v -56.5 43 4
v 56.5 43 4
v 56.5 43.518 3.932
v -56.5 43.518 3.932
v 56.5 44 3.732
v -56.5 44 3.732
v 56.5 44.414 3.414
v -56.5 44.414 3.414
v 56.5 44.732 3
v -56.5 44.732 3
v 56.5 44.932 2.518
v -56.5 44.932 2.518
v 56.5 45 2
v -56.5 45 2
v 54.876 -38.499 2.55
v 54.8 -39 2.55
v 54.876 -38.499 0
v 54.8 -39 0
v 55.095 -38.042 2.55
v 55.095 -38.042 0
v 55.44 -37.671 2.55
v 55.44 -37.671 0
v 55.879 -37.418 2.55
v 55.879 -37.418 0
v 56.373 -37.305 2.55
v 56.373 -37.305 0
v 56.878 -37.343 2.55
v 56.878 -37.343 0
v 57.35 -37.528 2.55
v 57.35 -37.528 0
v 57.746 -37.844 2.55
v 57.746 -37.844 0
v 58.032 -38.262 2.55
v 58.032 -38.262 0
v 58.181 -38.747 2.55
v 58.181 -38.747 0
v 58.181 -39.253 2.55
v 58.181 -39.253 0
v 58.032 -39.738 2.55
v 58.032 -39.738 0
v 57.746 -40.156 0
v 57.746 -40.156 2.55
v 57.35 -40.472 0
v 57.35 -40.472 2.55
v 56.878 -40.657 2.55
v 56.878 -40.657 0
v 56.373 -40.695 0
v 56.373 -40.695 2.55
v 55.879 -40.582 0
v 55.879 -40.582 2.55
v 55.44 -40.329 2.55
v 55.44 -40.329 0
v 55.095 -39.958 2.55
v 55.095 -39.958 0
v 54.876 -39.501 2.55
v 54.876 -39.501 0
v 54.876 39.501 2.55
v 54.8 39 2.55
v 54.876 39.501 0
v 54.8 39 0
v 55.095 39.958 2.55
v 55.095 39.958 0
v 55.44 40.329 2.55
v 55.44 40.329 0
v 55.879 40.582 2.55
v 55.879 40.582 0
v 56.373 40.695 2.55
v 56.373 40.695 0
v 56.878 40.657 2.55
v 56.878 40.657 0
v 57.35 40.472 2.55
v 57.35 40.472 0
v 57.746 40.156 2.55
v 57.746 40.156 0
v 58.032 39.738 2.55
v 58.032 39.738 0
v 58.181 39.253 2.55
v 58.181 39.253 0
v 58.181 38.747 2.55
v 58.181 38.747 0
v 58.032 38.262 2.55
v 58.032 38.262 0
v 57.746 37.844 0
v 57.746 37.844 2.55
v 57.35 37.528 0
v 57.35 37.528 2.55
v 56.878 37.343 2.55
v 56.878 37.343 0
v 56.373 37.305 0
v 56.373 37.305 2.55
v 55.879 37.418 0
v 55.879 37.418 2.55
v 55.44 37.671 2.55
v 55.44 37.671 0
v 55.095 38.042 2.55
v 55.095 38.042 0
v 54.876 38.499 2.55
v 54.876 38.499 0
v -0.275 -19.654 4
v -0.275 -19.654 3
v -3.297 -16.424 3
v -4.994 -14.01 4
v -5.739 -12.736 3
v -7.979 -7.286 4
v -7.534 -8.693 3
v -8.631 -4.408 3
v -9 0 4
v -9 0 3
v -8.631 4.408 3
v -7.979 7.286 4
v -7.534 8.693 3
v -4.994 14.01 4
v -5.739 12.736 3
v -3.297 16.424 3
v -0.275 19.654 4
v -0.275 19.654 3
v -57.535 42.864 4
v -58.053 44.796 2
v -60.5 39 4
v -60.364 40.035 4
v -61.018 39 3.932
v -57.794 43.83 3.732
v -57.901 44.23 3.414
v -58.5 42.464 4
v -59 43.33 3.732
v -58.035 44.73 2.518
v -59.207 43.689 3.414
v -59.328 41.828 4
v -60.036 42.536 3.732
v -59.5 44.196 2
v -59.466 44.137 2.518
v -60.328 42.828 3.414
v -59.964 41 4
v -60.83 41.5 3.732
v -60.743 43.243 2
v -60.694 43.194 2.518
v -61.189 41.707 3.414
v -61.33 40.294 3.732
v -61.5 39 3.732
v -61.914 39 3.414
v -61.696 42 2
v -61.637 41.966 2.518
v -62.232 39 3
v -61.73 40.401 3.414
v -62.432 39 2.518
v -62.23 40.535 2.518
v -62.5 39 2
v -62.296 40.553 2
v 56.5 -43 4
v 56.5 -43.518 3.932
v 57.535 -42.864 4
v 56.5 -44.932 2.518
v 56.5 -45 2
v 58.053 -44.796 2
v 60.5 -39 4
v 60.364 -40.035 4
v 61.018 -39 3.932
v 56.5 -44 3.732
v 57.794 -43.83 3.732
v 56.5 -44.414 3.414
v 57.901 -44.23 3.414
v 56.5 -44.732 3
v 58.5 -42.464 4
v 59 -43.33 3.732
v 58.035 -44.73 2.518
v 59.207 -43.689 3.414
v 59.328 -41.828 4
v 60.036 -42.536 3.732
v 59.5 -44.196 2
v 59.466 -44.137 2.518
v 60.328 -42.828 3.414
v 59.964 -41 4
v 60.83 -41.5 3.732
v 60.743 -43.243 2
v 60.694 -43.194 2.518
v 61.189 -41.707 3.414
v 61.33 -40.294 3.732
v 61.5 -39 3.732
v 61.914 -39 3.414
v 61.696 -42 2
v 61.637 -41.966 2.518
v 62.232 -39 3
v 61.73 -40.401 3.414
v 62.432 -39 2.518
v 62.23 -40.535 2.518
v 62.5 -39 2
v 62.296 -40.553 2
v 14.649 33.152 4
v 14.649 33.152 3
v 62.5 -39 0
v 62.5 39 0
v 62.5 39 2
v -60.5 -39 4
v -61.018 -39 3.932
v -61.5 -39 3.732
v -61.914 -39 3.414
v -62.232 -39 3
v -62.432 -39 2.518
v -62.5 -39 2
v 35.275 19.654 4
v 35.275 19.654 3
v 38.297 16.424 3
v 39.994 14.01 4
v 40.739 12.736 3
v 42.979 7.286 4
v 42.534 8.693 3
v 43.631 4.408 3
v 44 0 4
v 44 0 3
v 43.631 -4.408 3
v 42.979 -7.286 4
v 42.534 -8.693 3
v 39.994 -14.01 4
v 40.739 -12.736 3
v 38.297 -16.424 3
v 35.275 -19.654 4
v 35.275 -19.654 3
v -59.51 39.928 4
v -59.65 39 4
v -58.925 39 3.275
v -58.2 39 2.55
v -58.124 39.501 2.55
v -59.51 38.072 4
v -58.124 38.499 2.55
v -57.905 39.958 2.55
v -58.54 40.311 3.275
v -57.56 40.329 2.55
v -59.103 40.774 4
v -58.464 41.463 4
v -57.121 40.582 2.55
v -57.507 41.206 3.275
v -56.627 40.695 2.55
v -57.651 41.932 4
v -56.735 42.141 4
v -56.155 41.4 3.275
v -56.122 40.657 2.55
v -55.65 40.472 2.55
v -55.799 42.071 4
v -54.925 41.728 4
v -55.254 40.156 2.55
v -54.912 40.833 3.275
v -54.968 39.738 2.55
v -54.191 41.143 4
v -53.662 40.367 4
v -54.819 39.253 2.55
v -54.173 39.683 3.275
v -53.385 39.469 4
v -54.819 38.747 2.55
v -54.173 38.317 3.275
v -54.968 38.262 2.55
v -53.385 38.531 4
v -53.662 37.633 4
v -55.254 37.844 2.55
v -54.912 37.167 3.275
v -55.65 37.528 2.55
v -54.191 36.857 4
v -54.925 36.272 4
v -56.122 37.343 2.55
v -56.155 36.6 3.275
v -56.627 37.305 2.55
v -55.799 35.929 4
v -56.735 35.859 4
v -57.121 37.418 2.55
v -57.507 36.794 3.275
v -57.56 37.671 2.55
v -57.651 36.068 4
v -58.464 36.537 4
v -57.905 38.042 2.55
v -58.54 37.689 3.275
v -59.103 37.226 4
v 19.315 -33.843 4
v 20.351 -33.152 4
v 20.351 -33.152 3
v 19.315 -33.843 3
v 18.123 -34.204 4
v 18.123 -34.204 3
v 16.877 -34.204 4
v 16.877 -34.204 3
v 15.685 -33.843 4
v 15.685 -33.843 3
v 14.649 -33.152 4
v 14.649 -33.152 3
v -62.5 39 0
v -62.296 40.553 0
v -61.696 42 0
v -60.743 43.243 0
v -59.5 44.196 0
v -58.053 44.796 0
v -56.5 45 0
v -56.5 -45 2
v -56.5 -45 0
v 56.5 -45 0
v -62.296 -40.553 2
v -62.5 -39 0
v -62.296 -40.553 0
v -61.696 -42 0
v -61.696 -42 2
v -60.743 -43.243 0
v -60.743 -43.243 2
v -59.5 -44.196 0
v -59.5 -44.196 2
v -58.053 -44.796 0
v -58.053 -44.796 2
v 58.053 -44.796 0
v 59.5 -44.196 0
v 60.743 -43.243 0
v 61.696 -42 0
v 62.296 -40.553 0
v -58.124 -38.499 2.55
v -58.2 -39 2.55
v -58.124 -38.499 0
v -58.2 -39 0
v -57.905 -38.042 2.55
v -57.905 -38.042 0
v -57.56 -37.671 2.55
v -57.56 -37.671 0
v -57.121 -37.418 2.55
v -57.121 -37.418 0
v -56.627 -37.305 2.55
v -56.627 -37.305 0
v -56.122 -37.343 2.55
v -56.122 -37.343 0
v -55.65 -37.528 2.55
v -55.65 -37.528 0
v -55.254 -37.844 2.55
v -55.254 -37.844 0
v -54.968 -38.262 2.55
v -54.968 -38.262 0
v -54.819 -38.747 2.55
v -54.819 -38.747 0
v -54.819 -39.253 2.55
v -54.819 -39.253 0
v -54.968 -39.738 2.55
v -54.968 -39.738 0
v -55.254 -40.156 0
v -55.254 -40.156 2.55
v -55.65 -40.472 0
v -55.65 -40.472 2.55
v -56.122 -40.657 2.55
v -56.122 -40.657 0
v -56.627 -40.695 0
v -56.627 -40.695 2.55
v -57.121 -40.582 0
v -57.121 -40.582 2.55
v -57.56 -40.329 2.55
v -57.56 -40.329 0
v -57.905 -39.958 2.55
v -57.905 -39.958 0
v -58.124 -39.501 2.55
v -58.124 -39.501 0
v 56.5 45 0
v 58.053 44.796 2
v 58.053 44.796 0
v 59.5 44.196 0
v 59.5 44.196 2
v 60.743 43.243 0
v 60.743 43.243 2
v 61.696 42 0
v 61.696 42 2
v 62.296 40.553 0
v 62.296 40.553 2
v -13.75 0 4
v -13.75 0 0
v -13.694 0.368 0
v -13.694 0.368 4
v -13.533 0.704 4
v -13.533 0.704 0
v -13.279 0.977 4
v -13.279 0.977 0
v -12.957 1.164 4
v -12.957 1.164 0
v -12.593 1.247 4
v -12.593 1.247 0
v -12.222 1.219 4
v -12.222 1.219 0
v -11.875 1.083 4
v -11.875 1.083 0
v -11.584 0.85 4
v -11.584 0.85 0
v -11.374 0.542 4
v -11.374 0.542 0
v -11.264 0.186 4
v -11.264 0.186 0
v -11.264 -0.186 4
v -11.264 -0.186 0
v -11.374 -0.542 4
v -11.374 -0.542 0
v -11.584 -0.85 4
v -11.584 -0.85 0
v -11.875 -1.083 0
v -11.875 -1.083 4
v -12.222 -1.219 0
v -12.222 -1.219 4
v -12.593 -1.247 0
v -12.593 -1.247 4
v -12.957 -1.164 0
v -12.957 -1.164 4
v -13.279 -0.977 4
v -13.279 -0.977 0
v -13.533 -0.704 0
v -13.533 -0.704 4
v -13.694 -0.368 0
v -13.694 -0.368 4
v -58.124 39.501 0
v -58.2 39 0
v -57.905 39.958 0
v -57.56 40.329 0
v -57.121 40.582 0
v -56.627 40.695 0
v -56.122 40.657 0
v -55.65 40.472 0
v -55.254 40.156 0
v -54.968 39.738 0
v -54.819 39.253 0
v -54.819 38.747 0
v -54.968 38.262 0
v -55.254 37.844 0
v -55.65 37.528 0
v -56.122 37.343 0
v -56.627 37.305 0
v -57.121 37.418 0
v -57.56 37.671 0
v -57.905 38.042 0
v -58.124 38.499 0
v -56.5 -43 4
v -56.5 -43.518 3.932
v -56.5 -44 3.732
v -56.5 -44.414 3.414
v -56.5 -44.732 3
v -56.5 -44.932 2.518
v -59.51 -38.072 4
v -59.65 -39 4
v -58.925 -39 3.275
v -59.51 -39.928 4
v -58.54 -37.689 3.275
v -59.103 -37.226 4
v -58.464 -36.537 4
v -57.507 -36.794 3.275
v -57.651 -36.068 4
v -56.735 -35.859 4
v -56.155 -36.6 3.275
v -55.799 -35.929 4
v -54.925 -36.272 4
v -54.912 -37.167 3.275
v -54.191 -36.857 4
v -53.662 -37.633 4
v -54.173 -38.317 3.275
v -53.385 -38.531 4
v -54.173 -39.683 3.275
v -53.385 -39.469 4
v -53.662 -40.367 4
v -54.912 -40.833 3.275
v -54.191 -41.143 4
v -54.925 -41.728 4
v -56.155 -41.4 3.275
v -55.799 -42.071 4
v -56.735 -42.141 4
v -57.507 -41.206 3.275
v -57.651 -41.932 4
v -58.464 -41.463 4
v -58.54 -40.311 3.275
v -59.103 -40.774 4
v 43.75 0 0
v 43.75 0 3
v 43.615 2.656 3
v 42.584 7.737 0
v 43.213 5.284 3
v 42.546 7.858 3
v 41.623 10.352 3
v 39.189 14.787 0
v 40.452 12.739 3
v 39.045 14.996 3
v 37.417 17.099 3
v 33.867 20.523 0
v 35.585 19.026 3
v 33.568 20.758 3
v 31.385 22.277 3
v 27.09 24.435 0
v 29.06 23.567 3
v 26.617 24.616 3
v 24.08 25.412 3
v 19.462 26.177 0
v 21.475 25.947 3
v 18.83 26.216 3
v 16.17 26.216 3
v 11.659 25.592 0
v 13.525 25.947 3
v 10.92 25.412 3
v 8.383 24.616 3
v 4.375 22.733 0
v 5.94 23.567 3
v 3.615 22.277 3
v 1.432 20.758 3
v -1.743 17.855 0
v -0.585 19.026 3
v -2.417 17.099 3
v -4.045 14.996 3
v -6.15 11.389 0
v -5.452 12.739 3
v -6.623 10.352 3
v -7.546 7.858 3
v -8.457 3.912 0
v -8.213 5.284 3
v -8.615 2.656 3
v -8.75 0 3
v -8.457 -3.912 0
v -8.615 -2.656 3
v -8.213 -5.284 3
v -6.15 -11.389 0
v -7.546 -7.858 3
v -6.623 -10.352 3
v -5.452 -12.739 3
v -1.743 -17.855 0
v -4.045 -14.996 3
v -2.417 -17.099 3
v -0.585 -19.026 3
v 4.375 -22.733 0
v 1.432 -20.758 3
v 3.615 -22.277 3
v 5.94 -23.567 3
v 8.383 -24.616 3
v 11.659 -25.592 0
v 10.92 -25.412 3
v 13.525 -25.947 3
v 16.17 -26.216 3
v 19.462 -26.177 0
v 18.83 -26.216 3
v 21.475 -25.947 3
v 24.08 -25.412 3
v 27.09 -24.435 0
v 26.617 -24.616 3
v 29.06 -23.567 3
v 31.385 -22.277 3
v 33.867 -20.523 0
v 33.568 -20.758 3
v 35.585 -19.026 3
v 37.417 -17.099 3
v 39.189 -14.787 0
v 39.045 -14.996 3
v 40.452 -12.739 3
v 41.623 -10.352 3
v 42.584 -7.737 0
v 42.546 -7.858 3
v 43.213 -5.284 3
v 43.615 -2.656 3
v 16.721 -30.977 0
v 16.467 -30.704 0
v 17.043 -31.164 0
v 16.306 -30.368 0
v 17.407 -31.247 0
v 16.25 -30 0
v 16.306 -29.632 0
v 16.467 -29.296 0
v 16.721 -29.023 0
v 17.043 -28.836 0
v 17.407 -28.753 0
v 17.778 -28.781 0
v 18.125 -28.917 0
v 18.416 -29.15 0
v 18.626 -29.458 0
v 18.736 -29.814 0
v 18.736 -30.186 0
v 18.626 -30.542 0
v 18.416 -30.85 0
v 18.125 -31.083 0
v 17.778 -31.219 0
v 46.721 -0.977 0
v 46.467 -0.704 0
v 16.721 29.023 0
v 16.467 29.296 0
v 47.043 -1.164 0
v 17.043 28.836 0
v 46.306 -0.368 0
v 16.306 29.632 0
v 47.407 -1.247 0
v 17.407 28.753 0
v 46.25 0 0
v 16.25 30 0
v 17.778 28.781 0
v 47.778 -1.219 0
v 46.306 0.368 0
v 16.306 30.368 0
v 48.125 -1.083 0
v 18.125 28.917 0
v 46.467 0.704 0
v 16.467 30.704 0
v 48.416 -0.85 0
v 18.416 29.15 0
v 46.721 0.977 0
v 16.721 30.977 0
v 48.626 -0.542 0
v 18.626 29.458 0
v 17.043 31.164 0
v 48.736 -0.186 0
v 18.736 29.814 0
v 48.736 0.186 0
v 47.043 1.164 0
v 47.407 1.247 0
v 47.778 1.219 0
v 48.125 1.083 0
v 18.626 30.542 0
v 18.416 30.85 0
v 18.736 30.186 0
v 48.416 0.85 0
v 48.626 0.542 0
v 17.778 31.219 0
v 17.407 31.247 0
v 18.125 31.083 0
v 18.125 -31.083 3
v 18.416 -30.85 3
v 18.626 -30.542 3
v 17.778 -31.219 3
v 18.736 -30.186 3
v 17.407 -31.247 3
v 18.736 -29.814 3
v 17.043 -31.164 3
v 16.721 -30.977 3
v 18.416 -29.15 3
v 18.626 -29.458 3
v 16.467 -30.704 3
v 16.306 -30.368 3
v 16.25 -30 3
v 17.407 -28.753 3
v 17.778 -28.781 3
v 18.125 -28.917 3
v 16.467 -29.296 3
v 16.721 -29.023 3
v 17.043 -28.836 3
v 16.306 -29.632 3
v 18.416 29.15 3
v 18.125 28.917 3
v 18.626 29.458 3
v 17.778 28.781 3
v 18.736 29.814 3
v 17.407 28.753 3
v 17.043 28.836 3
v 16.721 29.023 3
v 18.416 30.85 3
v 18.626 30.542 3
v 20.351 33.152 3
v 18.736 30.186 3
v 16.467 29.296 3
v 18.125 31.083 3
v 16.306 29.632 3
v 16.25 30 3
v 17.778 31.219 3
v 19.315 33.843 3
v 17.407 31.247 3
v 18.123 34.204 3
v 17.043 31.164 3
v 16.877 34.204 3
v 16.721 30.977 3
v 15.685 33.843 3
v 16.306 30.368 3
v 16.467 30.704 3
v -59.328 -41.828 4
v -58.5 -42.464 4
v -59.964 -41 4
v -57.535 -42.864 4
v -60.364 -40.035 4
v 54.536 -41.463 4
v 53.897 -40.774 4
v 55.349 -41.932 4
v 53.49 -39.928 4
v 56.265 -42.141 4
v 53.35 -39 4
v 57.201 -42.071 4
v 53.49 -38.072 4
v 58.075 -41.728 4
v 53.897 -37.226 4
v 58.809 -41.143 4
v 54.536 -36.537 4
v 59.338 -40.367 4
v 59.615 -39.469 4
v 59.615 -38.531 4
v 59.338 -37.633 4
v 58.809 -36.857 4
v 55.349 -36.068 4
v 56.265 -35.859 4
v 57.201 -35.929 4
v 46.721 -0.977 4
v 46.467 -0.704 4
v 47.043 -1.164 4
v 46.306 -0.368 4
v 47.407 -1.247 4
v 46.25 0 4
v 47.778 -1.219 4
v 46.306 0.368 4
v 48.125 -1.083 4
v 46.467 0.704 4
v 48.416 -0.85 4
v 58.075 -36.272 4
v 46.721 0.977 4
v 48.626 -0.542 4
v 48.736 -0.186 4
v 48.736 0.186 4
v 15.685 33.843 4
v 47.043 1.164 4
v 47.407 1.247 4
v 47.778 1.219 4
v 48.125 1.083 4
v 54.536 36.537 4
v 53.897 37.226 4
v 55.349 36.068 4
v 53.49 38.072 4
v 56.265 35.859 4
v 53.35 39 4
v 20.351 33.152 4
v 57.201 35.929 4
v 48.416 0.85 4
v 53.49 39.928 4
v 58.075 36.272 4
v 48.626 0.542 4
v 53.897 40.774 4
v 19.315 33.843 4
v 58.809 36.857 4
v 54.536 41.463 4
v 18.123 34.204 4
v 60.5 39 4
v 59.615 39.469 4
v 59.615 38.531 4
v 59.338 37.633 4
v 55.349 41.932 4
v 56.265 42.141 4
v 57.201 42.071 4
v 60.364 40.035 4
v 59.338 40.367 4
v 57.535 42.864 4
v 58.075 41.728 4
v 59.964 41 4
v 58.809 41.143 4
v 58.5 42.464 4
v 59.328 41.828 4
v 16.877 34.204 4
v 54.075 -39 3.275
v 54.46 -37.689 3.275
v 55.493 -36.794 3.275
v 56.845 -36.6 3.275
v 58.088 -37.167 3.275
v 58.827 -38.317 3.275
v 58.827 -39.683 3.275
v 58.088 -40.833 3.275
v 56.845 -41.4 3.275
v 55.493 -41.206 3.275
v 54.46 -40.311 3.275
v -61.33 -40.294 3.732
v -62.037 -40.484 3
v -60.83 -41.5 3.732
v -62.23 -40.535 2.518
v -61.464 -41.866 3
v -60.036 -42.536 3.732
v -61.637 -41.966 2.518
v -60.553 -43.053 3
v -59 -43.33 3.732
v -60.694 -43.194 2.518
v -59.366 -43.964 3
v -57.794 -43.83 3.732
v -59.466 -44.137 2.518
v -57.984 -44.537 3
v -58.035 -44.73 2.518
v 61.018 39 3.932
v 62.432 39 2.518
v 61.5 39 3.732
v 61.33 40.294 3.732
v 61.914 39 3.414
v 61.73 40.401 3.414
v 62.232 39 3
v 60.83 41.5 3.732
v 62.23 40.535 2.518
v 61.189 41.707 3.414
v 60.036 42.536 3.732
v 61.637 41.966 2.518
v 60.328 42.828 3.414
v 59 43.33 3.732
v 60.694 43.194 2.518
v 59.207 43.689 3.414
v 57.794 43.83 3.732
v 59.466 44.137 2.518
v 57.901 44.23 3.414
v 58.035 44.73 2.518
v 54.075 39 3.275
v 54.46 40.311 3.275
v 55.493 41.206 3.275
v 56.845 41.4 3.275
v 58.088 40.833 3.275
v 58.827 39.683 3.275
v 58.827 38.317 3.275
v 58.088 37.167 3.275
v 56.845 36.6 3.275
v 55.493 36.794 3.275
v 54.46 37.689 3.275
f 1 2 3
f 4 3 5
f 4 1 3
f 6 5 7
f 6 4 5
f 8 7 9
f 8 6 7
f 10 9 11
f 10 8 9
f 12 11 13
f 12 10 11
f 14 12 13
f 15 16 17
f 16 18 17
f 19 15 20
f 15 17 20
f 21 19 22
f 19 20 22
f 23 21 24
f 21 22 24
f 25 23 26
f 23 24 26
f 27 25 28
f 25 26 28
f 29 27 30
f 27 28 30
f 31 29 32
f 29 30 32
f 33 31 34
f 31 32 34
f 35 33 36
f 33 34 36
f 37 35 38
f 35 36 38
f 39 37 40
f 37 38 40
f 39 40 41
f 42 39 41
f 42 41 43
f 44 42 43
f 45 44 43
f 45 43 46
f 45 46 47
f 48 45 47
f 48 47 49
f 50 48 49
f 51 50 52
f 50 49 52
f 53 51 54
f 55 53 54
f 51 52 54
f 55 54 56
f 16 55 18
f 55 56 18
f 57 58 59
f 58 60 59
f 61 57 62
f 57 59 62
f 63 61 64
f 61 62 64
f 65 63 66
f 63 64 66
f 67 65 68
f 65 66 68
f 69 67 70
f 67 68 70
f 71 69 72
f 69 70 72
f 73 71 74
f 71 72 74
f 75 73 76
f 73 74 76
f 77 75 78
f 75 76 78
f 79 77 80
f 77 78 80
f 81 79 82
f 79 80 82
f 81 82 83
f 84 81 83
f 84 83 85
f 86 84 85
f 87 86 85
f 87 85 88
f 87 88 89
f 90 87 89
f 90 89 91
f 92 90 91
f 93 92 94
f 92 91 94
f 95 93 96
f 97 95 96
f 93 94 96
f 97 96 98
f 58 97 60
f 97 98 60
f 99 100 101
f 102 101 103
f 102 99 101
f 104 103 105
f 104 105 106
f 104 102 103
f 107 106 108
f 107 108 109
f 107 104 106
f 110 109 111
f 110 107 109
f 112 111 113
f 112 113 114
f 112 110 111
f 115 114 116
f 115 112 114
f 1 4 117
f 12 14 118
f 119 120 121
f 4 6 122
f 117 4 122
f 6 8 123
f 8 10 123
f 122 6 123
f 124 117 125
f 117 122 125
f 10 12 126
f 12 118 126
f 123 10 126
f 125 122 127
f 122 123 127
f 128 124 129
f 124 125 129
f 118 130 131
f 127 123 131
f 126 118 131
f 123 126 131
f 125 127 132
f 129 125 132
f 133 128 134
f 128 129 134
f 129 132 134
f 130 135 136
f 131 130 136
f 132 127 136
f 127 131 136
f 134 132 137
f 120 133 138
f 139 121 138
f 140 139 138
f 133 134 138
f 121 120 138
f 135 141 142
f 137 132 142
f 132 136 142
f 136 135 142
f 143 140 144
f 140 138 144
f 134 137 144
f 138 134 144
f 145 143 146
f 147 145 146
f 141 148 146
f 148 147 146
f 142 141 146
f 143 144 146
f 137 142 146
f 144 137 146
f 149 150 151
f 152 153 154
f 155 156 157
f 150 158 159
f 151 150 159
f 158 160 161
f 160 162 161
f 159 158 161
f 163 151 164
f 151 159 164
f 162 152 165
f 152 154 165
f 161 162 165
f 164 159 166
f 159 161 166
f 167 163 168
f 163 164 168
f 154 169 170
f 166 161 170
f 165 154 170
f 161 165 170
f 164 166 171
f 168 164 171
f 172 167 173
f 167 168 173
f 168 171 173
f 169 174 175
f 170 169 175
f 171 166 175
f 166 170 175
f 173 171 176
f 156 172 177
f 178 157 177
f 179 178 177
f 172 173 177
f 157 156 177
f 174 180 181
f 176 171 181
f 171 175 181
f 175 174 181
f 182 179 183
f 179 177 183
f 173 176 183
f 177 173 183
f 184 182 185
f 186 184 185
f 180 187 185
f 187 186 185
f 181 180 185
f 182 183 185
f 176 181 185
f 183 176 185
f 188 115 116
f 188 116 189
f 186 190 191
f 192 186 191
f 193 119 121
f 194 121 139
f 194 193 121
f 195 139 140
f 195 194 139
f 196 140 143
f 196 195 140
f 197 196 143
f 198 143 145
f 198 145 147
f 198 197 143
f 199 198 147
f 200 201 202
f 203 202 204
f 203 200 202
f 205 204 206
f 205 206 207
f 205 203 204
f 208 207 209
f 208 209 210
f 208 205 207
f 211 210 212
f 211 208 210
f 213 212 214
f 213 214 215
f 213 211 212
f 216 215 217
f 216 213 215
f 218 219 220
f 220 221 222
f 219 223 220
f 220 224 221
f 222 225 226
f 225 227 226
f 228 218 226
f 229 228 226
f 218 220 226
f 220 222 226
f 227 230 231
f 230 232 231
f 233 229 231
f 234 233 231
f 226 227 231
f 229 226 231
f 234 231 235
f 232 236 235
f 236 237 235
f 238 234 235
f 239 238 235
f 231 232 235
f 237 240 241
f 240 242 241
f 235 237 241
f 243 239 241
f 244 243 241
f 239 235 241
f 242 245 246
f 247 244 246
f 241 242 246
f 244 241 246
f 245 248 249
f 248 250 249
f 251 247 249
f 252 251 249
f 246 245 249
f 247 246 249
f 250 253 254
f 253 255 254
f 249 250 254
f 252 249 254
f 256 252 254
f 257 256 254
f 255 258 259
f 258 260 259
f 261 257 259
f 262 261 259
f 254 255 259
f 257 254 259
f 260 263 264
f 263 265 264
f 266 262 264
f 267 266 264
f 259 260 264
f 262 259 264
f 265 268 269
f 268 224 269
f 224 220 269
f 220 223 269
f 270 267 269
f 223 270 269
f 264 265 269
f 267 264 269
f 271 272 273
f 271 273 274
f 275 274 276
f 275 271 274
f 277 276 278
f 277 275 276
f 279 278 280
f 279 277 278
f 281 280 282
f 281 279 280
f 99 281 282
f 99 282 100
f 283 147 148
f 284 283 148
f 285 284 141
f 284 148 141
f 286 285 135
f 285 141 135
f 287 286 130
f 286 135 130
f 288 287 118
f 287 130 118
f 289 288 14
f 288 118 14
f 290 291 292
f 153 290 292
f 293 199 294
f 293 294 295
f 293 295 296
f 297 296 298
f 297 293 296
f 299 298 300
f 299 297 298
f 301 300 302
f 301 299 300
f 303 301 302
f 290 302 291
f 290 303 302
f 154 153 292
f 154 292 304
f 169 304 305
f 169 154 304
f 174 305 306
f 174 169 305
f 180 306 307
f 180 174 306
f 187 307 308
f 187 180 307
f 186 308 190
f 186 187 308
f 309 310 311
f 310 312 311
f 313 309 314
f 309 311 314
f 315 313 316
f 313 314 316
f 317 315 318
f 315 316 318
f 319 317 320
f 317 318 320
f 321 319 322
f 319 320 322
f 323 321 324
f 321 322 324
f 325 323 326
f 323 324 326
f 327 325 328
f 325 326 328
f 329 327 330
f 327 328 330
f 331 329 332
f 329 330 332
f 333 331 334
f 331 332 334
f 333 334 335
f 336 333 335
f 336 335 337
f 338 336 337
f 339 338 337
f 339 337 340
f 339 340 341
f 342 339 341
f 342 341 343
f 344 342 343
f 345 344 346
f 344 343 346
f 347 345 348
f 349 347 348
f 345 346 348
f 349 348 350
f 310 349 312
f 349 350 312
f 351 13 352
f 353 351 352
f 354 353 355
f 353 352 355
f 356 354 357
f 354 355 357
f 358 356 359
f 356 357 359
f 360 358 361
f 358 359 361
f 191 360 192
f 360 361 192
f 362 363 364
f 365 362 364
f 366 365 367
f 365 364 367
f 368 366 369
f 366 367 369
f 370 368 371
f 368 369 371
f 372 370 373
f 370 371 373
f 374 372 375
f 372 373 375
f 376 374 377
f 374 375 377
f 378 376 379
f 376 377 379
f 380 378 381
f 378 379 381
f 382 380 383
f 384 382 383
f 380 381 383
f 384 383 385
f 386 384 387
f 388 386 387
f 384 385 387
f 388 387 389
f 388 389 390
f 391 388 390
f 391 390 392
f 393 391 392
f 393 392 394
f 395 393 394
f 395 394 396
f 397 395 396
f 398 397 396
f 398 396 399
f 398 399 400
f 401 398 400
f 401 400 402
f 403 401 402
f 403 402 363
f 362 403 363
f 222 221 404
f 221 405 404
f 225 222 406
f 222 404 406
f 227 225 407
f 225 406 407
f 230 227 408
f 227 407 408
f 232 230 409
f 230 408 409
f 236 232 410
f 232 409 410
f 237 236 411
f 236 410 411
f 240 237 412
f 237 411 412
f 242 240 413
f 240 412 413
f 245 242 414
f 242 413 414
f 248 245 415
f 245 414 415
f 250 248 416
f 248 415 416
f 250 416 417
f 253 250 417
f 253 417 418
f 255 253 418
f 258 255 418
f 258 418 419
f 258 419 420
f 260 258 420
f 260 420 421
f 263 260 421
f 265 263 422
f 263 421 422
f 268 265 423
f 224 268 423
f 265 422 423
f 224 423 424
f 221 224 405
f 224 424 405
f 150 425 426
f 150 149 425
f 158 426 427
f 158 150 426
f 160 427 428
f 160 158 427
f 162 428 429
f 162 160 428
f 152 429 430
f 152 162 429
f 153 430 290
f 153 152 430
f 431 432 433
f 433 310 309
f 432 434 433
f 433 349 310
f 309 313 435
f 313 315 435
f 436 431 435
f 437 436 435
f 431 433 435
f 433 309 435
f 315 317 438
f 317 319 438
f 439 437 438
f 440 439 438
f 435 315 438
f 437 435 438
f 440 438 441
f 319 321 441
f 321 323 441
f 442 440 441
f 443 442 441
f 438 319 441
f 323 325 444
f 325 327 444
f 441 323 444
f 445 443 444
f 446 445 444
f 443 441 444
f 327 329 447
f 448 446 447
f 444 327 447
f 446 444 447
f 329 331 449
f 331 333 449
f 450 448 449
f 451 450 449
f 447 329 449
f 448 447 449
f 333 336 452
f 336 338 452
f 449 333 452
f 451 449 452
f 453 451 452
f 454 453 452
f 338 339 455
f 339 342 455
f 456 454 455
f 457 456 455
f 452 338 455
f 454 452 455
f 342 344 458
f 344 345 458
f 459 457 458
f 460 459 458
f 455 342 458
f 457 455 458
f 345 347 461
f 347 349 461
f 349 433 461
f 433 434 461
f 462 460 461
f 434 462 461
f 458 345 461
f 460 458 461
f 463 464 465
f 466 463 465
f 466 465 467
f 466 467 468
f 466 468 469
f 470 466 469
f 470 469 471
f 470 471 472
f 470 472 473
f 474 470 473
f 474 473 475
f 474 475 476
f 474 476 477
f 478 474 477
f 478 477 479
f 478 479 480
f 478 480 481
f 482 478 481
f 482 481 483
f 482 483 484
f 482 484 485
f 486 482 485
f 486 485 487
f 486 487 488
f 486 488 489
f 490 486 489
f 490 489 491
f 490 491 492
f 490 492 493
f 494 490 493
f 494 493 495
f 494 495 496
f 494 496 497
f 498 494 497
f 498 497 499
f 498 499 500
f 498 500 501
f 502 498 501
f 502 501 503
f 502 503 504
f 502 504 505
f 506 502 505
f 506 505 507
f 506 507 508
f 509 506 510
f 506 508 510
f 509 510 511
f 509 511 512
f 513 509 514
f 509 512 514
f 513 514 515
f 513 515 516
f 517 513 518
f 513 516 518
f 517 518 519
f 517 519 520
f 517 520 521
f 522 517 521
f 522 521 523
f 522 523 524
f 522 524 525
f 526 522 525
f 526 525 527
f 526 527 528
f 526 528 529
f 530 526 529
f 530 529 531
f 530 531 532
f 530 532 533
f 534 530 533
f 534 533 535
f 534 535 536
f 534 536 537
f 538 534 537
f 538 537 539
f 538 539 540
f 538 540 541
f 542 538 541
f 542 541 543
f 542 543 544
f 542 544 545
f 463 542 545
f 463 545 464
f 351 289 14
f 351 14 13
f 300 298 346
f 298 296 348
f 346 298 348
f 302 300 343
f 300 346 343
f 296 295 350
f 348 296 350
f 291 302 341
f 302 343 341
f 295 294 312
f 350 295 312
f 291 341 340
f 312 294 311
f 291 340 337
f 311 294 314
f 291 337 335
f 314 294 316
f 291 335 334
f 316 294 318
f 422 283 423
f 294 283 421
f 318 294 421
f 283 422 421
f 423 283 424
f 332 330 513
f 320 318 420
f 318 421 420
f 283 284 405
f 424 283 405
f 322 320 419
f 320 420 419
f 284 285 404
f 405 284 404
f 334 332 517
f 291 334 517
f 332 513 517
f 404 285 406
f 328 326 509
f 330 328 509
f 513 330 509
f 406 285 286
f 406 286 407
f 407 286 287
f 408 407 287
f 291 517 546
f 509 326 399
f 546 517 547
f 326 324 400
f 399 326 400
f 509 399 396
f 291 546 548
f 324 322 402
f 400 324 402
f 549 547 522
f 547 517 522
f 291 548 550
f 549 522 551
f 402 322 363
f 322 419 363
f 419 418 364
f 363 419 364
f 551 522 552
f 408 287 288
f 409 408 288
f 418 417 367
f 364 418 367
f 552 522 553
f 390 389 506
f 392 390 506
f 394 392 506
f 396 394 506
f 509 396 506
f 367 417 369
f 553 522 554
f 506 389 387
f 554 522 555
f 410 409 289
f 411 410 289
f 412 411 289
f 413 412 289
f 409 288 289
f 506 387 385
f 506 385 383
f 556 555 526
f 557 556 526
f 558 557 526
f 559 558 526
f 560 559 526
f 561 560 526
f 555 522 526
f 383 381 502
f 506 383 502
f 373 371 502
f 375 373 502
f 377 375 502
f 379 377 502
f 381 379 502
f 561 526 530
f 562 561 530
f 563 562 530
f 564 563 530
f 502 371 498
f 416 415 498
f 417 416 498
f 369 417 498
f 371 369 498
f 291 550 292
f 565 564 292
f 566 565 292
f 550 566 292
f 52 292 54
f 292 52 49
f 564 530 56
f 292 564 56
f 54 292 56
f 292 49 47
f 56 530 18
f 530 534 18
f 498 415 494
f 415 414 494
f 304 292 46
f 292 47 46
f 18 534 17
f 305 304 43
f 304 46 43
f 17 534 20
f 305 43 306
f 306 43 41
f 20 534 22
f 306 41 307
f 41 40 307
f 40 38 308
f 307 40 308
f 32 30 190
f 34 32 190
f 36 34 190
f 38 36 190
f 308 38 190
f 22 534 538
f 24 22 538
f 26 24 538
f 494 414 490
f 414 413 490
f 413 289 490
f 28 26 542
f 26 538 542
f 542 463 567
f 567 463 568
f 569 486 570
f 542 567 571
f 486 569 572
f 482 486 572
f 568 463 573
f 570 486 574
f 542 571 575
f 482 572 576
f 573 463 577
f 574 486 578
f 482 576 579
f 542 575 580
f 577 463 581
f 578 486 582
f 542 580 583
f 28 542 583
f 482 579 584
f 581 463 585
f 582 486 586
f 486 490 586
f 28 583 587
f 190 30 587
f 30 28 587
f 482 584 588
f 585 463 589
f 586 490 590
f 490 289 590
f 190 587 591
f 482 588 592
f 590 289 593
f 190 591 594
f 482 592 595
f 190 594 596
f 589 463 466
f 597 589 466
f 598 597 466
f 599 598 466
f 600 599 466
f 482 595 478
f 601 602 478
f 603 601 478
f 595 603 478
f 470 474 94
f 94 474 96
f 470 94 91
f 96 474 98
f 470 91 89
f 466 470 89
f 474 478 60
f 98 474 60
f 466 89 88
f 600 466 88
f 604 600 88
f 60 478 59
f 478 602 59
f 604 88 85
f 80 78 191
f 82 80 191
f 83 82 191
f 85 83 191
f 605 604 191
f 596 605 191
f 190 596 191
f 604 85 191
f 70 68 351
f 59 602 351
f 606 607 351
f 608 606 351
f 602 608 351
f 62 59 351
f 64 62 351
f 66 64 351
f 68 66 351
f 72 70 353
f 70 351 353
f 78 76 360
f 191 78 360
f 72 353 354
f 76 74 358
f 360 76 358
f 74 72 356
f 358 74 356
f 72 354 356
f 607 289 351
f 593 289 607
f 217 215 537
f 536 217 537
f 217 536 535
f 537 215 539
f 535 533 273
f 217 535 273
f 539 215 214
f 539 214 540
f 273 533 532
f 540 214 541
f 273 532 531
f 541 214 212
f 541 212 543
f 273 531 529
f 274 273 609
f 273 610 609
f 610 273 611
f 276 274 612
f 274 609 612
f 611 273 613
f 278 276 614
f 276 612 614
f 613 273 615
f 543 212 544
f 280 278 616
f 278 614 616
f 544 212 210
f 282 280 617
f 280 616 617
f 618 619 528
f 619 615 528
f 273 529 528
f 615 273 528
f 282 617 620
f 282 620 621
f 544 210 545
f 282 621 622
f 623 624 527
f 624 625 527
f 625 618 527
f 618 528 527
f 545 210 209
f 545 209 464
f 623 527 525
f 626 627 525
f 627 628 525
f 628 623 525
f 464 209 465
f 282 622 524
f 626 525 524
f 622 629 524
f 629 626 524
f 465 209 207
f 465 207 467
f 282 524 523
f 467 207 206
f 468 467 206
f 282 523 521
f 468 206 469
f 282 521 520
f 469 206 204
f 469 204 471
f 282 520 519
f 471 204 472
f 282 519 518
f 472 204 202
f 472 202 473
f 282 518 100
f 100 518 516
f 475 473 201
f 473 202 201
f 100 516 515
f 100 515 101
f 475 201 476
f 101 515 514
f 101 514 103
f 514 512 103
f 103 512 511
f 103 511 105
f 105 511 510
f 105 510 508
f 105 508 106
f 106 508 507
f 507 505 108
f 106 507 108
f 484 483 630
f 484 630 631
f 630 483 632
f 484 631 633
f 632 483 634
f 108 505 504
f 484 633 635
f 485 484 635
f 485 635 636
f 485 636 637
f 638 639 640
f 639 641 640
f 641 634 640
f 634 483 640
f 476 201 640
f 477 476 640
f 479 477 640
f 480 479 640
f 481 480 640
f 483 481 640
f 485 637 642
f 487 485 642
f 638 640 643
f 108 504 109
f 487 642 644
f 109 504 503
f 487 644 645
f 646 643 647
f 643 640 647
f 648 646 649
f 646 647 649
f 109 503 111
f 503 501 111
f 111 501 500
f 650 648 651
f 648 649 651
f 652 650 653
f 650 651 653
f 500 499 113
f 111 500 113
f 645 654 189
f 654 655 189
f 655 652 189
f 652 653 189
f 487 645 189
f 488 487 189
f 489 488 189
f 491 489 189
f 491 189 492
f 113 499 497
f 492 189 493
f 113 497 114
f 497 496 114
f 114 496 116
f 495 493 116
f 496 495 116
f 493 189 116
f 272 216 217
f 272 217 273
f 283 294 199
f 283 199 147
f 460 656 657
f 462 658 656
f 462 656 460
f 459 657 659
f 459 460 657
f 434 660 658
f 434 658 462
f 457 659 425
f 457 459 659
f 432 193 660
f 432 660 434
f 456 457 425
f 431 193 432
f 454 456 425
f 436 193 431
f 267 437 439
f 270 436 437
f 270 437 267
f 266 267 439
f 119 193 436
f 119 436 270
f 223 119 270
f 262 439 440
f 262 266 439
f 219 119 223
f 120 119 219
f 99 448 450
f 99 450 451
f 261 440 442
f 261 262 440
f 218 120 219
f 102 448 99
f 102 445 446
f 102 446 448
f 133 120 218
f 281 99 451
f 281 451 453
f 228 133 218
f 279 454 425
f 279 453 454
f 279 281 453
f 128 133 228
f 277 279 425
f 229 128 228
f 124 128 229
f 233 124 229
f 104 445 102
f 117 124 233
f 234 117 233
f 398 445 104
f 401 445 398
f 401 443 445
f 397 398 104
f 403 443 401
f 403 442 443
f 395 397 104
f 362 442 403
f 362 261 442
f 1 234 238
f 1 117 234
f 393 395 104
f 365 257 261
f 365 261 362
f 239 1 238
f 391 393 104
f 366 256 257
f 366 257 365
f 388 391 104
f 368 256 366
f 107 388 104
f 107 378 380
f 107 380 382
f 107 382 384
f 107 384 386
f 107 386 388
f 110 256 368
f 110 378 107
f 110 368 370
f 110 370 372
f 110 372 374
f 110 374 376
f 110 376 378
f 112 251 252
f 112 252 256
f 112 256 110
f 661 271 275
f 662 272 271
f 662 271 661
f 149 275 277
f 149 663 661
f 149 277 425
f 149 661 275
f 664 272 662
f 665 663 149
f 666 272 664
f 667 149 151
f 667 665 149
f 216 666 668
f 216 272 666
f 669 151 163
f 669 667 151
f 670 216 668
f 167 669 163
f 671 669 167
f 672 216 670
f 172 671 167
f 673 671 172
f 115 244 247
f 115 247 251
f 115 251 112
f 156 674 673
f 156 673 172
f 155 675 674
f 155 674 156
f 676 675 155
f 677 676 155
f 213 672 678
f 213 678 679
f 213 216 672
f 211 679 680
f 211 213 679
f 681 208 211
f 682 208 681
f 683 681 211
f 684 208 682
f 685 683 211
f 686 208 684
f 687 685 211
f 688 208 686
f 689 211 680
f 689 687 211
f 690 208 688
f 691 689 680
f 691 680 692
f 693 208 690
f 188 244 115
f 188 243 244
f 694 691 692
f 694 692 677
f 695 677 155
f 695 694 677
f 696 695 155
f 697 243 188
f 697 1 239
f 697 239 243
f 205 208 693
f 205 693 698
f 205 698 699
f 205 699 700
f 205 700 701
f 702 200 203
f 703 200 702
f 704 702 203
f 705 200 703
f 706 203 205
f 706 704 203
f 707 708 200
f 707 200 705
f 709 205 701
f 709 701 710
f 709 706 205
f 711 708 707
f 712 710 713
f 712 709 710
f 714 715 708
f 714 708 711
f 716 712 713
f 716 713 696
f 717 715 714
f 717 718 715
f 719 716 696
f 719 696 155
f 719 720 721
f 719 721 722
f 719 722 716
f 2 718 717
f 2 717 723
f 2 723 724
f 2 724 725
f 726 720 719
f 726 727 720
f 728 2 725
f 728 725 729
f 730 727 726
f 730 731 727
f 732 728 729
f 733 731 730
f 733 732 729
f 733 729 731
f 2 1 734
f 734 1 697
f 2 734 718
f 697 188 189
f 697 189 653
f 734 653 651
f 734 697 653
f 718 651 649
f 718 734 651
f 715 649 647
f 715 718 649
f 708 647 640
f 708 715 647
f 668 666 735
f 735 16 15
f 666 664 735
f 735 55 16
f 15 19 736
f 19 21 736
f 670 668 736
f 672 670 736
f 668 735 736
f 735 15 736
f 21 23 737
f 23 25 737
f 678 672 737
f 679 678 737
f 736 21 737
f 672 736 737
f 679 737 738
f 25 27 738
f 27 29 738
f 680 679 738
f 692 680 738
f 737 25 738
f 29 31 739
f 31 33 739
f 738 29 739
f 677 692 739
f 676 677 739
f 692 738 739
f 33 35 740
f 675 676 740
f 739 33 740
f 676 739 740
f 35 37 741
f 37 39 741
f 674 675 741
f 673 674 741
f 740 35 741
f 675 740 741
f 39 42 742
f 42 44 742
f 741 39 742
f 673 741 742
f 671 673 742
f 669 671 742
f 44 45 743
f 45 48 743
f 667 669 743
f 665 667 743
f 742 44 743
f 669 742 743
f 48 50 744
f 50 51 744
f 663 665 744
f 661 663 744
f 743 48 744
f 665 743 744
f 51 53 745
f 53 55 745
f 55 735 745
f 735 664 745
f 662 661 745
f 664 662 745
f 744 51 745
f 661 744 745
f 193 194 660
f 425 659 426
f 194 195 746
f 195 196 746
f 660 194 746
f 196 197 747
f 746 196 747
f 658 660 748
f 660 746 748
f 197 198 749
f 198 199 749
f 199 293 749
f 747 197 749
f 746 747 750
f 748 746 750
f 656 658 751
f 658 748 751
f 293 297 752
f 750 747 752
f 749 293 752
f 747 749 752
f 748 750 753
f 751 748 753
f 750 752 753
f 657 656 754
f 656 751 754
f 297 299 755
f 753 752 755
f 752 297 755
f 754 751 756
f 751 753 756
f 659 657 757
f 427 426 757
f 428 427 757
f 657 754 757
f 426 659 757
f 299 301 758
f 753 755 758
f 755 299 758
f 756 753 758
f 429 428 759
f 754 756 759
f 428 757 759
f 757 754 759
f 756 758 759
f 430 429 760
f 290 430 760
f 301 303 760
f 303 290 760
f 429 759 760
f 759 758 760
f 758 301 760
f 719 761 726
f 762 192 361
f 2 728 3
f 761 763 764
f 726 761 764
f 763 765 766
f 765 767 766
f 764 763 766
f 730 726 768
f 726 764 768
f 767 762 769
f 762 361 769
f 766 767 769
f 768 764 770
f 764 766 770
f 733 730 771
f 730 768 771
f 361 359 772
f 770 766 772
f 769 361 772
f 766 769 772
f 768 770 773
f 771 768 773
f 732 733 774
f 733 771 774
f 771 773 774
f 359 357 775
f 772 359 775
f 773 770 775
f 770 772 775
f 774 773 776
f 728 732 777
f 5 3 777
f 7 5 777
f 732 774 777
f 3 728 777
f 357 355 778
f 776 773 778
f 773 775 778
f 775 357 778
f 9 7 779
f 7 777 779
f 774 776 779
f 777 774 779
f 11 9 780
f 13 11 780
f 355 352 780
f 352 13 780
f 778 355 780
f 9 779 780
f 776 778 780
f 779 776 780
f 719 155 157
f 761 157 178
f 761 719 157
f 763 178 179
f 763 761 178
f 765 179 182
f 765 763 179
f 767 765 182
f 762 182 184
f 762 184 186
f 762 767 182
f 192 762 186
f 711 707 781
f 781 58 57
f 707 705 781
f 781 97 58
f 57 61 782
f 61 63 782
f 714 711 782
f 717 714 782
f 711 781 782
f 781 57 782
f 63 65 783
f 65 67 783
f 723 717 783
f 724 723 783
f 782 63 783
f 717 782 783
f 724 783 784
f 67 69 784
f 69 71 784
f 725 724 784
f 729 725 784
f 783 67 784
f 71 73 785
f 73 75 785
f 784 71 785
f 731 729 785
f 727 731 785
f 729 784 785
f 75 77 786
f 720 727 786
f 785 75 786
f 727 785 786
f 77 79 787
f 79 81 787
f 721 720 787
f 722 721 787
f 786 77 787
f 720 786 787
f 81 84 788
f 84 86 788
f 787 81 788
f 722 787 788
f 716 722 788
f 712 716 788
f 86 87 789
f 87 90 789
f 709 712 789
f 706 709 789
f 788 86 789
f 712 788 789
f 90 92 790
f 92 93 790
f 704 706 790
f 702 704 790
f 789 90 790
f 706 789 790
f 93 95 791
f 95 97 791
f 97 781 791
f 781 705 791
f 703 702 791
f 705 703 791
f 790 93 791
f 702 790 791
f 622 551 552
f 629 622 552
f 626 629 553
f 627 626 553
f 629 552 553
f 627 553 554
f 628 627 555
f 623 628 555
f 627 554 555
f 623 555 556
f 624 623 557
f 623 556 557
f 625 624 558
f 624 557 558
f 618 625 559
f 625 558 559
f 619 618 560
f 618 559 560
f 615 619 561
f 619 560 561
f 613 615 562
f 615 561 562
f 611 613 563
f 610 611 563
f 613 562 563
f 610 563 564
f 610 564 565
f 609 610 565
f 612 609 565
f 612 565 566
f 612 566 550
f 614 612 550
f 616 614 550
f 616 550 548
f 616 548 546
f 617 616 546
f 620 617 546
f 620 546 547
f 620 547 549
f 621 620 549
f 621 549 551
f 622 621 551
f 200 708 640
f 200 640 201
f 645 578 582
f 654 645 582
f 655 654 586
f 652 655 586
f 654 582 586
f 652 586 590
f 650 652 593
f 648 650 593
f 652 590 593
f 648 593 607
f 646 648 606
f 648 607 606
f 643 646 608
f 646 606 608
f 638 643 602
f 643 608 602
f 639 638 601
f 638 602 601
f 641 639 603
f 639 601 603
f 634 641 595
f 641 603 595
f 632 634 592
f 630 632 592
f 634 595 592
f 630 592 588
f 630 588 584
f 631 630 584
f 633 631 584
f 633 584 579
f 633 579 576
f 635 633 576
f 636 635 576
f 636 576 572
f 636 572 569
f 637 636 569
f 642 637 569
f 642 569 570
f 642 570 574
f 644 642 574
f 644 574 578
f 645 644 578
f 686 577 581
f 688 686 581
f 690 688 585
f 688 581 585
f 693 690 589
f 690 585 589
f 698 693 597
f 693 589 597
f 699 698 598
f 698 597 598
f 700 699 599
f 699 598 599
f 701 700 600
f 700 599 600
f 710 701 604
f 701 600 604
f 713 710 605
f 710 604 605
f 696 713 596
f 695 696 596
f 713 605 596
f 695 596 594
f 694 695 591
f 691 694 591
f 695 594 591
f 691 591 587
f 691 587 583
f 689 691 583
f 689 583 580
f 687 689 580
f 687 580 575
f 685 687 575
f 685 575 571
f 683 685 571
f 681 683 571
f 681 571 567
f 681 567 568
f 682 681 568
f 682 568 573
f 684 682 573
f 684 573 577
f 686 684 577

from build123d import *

# Parameters (mm, degrees)
SKETCH1_W                                       = 125
SKETCH1_H                                       = 90
BOSS_EXTRUDE1_DEPTH                             = 4
SKETCH2_R                                       = 26.25
CUT_EXTRUDE2_DEPTH                              = 78.11841544
FILLET1_R                                       = 6
FILLET2_R                                       = 2
CSK_FOR_M3_FLAT_HEAD_MACHINE_SCREW1_D           = 3.4
CSK_FOR_M3_FLAT_HEAD_MACHINE_SCREW1_CSINK_D     = 6.3
CSK_FOR_M3_FLAT_HEAD_MACHINE_SCREW1_CSINK_ANGLE = 90
CUT_EXTRUDE3_DEPTH                              = 1
M3X0_5_TAPPED_HOLE1_D                           = 2.5


with BuildPart() as part:
    # Sketch1 → Boss-Extrude1 (new body)
    with BuildSketch(Plane.XY):
        Rectangle(SKETCH1_W, SKETCH1_H)
    extrude(amount=BOSS_EXTRUDE1_DEPTH)

    # Sketch2 → Cut-Extrude2 (cut, through all)
    with BuildSketch(Plane.XY.offset(4)):
        with Locations((17.5, 0)):
            Circle(SKETCH2_R)
    extrude(amount=-CUT_EXTRUDE2_DEPTH, mode=Mode.SUBTRACT)

    # Fillet1
    fillet1_edges = [part.edges().sort_by_distance(p)[0] for p in [
        (62.5, -45, 2),
        (-62.5, -45, 2),
        (-62.5, 45, 2),
        (62.5, 45, 2),
    ]]
    fillet(fillet1_edges, radius=FILLET1_R)

    # Fillet2
    fillet2_edges = [part.edges().sort_by_distance(p)[0] for p in [
        (0, -45, 4),
        (-62.5, 0, 4),
        (62.5, 0, 4),
        (0, 45, 4),
        (-60.742640687, 43.242640687, 4),
        (60.742640687, 43.242640687, 4),
        (60.742640687, -43.242640687, 4),
        (-60.742640687, -43.242640687, 4),
    ]]
    fillet(fillet2_edges, radius=FILLET2_R)

    # CSK for M3 Flat Head Machine Screw1 (through all)
    with Locations(Plane.XY.offset(4)):
        with Locations((-56.5, 39), (56.5, 39), (56.5, -39), (-56.5, -39)):
            CounterSinkHole(CSK_FOR_M3_FLAT_HEAD_MACHINE_SCREW1_D / 2, CSK_FOR_M3_FLAT_HEAD_MACHINE_SCREW1_CSINK_D / 2, counter_sink_angle=CSK_FOR_M3_FLAT_HEAD_MACHINE_SCREW1_CSINK_ANGLE)

    # Sketch2<5> → Cut-Extrude3 (cut)
    with BuildSketch(Plane.XY.offset(4)):
        with BuildLine():
            Line((-0.275368706, 19.654166667), (14.649233321, 33.152083333))
            ThreePointArc((14.649233321, 33.152083333), (17.5, 34.25), (20.350766679, 33.152083333))
            Line((20.350766679, 33.152083333), (35.275368706, 19.654166667))
            ThreePointArc((35.275368706, 19.654166667), (44, 0), (35.275368706, -19.654166667))
            Line((35.275368706, -19.654166667), (20.350766679, -33.152083333))
            ThreePointArc((20.350766679, -33.152083333), (17.5, -34.25), (14.649233321, -33.152083333))
            Line((14.649233321, -33.152083333), (-0.275368706, -19.654166667))
            ThreePointArc((-0.275368706, -19.654166667), (-9, 0), (-0.275368706, 19.654166667))
        make_face()
    extrude(amount=-CUT_EXTRUDE3_DEPTH, mode=Mode.SUBTRACT)

    # M3x0.5 Tapped Hole1 (through all)
    with Locations(Plane.XY.offset(4)):
        with Locations((17.5, 30), (47.5, 0), (17.5, -30), (-12.5, 0)):
            Hole(M3X0_5_TAPPED_HOLE1_D / 2)


solid = part.part
